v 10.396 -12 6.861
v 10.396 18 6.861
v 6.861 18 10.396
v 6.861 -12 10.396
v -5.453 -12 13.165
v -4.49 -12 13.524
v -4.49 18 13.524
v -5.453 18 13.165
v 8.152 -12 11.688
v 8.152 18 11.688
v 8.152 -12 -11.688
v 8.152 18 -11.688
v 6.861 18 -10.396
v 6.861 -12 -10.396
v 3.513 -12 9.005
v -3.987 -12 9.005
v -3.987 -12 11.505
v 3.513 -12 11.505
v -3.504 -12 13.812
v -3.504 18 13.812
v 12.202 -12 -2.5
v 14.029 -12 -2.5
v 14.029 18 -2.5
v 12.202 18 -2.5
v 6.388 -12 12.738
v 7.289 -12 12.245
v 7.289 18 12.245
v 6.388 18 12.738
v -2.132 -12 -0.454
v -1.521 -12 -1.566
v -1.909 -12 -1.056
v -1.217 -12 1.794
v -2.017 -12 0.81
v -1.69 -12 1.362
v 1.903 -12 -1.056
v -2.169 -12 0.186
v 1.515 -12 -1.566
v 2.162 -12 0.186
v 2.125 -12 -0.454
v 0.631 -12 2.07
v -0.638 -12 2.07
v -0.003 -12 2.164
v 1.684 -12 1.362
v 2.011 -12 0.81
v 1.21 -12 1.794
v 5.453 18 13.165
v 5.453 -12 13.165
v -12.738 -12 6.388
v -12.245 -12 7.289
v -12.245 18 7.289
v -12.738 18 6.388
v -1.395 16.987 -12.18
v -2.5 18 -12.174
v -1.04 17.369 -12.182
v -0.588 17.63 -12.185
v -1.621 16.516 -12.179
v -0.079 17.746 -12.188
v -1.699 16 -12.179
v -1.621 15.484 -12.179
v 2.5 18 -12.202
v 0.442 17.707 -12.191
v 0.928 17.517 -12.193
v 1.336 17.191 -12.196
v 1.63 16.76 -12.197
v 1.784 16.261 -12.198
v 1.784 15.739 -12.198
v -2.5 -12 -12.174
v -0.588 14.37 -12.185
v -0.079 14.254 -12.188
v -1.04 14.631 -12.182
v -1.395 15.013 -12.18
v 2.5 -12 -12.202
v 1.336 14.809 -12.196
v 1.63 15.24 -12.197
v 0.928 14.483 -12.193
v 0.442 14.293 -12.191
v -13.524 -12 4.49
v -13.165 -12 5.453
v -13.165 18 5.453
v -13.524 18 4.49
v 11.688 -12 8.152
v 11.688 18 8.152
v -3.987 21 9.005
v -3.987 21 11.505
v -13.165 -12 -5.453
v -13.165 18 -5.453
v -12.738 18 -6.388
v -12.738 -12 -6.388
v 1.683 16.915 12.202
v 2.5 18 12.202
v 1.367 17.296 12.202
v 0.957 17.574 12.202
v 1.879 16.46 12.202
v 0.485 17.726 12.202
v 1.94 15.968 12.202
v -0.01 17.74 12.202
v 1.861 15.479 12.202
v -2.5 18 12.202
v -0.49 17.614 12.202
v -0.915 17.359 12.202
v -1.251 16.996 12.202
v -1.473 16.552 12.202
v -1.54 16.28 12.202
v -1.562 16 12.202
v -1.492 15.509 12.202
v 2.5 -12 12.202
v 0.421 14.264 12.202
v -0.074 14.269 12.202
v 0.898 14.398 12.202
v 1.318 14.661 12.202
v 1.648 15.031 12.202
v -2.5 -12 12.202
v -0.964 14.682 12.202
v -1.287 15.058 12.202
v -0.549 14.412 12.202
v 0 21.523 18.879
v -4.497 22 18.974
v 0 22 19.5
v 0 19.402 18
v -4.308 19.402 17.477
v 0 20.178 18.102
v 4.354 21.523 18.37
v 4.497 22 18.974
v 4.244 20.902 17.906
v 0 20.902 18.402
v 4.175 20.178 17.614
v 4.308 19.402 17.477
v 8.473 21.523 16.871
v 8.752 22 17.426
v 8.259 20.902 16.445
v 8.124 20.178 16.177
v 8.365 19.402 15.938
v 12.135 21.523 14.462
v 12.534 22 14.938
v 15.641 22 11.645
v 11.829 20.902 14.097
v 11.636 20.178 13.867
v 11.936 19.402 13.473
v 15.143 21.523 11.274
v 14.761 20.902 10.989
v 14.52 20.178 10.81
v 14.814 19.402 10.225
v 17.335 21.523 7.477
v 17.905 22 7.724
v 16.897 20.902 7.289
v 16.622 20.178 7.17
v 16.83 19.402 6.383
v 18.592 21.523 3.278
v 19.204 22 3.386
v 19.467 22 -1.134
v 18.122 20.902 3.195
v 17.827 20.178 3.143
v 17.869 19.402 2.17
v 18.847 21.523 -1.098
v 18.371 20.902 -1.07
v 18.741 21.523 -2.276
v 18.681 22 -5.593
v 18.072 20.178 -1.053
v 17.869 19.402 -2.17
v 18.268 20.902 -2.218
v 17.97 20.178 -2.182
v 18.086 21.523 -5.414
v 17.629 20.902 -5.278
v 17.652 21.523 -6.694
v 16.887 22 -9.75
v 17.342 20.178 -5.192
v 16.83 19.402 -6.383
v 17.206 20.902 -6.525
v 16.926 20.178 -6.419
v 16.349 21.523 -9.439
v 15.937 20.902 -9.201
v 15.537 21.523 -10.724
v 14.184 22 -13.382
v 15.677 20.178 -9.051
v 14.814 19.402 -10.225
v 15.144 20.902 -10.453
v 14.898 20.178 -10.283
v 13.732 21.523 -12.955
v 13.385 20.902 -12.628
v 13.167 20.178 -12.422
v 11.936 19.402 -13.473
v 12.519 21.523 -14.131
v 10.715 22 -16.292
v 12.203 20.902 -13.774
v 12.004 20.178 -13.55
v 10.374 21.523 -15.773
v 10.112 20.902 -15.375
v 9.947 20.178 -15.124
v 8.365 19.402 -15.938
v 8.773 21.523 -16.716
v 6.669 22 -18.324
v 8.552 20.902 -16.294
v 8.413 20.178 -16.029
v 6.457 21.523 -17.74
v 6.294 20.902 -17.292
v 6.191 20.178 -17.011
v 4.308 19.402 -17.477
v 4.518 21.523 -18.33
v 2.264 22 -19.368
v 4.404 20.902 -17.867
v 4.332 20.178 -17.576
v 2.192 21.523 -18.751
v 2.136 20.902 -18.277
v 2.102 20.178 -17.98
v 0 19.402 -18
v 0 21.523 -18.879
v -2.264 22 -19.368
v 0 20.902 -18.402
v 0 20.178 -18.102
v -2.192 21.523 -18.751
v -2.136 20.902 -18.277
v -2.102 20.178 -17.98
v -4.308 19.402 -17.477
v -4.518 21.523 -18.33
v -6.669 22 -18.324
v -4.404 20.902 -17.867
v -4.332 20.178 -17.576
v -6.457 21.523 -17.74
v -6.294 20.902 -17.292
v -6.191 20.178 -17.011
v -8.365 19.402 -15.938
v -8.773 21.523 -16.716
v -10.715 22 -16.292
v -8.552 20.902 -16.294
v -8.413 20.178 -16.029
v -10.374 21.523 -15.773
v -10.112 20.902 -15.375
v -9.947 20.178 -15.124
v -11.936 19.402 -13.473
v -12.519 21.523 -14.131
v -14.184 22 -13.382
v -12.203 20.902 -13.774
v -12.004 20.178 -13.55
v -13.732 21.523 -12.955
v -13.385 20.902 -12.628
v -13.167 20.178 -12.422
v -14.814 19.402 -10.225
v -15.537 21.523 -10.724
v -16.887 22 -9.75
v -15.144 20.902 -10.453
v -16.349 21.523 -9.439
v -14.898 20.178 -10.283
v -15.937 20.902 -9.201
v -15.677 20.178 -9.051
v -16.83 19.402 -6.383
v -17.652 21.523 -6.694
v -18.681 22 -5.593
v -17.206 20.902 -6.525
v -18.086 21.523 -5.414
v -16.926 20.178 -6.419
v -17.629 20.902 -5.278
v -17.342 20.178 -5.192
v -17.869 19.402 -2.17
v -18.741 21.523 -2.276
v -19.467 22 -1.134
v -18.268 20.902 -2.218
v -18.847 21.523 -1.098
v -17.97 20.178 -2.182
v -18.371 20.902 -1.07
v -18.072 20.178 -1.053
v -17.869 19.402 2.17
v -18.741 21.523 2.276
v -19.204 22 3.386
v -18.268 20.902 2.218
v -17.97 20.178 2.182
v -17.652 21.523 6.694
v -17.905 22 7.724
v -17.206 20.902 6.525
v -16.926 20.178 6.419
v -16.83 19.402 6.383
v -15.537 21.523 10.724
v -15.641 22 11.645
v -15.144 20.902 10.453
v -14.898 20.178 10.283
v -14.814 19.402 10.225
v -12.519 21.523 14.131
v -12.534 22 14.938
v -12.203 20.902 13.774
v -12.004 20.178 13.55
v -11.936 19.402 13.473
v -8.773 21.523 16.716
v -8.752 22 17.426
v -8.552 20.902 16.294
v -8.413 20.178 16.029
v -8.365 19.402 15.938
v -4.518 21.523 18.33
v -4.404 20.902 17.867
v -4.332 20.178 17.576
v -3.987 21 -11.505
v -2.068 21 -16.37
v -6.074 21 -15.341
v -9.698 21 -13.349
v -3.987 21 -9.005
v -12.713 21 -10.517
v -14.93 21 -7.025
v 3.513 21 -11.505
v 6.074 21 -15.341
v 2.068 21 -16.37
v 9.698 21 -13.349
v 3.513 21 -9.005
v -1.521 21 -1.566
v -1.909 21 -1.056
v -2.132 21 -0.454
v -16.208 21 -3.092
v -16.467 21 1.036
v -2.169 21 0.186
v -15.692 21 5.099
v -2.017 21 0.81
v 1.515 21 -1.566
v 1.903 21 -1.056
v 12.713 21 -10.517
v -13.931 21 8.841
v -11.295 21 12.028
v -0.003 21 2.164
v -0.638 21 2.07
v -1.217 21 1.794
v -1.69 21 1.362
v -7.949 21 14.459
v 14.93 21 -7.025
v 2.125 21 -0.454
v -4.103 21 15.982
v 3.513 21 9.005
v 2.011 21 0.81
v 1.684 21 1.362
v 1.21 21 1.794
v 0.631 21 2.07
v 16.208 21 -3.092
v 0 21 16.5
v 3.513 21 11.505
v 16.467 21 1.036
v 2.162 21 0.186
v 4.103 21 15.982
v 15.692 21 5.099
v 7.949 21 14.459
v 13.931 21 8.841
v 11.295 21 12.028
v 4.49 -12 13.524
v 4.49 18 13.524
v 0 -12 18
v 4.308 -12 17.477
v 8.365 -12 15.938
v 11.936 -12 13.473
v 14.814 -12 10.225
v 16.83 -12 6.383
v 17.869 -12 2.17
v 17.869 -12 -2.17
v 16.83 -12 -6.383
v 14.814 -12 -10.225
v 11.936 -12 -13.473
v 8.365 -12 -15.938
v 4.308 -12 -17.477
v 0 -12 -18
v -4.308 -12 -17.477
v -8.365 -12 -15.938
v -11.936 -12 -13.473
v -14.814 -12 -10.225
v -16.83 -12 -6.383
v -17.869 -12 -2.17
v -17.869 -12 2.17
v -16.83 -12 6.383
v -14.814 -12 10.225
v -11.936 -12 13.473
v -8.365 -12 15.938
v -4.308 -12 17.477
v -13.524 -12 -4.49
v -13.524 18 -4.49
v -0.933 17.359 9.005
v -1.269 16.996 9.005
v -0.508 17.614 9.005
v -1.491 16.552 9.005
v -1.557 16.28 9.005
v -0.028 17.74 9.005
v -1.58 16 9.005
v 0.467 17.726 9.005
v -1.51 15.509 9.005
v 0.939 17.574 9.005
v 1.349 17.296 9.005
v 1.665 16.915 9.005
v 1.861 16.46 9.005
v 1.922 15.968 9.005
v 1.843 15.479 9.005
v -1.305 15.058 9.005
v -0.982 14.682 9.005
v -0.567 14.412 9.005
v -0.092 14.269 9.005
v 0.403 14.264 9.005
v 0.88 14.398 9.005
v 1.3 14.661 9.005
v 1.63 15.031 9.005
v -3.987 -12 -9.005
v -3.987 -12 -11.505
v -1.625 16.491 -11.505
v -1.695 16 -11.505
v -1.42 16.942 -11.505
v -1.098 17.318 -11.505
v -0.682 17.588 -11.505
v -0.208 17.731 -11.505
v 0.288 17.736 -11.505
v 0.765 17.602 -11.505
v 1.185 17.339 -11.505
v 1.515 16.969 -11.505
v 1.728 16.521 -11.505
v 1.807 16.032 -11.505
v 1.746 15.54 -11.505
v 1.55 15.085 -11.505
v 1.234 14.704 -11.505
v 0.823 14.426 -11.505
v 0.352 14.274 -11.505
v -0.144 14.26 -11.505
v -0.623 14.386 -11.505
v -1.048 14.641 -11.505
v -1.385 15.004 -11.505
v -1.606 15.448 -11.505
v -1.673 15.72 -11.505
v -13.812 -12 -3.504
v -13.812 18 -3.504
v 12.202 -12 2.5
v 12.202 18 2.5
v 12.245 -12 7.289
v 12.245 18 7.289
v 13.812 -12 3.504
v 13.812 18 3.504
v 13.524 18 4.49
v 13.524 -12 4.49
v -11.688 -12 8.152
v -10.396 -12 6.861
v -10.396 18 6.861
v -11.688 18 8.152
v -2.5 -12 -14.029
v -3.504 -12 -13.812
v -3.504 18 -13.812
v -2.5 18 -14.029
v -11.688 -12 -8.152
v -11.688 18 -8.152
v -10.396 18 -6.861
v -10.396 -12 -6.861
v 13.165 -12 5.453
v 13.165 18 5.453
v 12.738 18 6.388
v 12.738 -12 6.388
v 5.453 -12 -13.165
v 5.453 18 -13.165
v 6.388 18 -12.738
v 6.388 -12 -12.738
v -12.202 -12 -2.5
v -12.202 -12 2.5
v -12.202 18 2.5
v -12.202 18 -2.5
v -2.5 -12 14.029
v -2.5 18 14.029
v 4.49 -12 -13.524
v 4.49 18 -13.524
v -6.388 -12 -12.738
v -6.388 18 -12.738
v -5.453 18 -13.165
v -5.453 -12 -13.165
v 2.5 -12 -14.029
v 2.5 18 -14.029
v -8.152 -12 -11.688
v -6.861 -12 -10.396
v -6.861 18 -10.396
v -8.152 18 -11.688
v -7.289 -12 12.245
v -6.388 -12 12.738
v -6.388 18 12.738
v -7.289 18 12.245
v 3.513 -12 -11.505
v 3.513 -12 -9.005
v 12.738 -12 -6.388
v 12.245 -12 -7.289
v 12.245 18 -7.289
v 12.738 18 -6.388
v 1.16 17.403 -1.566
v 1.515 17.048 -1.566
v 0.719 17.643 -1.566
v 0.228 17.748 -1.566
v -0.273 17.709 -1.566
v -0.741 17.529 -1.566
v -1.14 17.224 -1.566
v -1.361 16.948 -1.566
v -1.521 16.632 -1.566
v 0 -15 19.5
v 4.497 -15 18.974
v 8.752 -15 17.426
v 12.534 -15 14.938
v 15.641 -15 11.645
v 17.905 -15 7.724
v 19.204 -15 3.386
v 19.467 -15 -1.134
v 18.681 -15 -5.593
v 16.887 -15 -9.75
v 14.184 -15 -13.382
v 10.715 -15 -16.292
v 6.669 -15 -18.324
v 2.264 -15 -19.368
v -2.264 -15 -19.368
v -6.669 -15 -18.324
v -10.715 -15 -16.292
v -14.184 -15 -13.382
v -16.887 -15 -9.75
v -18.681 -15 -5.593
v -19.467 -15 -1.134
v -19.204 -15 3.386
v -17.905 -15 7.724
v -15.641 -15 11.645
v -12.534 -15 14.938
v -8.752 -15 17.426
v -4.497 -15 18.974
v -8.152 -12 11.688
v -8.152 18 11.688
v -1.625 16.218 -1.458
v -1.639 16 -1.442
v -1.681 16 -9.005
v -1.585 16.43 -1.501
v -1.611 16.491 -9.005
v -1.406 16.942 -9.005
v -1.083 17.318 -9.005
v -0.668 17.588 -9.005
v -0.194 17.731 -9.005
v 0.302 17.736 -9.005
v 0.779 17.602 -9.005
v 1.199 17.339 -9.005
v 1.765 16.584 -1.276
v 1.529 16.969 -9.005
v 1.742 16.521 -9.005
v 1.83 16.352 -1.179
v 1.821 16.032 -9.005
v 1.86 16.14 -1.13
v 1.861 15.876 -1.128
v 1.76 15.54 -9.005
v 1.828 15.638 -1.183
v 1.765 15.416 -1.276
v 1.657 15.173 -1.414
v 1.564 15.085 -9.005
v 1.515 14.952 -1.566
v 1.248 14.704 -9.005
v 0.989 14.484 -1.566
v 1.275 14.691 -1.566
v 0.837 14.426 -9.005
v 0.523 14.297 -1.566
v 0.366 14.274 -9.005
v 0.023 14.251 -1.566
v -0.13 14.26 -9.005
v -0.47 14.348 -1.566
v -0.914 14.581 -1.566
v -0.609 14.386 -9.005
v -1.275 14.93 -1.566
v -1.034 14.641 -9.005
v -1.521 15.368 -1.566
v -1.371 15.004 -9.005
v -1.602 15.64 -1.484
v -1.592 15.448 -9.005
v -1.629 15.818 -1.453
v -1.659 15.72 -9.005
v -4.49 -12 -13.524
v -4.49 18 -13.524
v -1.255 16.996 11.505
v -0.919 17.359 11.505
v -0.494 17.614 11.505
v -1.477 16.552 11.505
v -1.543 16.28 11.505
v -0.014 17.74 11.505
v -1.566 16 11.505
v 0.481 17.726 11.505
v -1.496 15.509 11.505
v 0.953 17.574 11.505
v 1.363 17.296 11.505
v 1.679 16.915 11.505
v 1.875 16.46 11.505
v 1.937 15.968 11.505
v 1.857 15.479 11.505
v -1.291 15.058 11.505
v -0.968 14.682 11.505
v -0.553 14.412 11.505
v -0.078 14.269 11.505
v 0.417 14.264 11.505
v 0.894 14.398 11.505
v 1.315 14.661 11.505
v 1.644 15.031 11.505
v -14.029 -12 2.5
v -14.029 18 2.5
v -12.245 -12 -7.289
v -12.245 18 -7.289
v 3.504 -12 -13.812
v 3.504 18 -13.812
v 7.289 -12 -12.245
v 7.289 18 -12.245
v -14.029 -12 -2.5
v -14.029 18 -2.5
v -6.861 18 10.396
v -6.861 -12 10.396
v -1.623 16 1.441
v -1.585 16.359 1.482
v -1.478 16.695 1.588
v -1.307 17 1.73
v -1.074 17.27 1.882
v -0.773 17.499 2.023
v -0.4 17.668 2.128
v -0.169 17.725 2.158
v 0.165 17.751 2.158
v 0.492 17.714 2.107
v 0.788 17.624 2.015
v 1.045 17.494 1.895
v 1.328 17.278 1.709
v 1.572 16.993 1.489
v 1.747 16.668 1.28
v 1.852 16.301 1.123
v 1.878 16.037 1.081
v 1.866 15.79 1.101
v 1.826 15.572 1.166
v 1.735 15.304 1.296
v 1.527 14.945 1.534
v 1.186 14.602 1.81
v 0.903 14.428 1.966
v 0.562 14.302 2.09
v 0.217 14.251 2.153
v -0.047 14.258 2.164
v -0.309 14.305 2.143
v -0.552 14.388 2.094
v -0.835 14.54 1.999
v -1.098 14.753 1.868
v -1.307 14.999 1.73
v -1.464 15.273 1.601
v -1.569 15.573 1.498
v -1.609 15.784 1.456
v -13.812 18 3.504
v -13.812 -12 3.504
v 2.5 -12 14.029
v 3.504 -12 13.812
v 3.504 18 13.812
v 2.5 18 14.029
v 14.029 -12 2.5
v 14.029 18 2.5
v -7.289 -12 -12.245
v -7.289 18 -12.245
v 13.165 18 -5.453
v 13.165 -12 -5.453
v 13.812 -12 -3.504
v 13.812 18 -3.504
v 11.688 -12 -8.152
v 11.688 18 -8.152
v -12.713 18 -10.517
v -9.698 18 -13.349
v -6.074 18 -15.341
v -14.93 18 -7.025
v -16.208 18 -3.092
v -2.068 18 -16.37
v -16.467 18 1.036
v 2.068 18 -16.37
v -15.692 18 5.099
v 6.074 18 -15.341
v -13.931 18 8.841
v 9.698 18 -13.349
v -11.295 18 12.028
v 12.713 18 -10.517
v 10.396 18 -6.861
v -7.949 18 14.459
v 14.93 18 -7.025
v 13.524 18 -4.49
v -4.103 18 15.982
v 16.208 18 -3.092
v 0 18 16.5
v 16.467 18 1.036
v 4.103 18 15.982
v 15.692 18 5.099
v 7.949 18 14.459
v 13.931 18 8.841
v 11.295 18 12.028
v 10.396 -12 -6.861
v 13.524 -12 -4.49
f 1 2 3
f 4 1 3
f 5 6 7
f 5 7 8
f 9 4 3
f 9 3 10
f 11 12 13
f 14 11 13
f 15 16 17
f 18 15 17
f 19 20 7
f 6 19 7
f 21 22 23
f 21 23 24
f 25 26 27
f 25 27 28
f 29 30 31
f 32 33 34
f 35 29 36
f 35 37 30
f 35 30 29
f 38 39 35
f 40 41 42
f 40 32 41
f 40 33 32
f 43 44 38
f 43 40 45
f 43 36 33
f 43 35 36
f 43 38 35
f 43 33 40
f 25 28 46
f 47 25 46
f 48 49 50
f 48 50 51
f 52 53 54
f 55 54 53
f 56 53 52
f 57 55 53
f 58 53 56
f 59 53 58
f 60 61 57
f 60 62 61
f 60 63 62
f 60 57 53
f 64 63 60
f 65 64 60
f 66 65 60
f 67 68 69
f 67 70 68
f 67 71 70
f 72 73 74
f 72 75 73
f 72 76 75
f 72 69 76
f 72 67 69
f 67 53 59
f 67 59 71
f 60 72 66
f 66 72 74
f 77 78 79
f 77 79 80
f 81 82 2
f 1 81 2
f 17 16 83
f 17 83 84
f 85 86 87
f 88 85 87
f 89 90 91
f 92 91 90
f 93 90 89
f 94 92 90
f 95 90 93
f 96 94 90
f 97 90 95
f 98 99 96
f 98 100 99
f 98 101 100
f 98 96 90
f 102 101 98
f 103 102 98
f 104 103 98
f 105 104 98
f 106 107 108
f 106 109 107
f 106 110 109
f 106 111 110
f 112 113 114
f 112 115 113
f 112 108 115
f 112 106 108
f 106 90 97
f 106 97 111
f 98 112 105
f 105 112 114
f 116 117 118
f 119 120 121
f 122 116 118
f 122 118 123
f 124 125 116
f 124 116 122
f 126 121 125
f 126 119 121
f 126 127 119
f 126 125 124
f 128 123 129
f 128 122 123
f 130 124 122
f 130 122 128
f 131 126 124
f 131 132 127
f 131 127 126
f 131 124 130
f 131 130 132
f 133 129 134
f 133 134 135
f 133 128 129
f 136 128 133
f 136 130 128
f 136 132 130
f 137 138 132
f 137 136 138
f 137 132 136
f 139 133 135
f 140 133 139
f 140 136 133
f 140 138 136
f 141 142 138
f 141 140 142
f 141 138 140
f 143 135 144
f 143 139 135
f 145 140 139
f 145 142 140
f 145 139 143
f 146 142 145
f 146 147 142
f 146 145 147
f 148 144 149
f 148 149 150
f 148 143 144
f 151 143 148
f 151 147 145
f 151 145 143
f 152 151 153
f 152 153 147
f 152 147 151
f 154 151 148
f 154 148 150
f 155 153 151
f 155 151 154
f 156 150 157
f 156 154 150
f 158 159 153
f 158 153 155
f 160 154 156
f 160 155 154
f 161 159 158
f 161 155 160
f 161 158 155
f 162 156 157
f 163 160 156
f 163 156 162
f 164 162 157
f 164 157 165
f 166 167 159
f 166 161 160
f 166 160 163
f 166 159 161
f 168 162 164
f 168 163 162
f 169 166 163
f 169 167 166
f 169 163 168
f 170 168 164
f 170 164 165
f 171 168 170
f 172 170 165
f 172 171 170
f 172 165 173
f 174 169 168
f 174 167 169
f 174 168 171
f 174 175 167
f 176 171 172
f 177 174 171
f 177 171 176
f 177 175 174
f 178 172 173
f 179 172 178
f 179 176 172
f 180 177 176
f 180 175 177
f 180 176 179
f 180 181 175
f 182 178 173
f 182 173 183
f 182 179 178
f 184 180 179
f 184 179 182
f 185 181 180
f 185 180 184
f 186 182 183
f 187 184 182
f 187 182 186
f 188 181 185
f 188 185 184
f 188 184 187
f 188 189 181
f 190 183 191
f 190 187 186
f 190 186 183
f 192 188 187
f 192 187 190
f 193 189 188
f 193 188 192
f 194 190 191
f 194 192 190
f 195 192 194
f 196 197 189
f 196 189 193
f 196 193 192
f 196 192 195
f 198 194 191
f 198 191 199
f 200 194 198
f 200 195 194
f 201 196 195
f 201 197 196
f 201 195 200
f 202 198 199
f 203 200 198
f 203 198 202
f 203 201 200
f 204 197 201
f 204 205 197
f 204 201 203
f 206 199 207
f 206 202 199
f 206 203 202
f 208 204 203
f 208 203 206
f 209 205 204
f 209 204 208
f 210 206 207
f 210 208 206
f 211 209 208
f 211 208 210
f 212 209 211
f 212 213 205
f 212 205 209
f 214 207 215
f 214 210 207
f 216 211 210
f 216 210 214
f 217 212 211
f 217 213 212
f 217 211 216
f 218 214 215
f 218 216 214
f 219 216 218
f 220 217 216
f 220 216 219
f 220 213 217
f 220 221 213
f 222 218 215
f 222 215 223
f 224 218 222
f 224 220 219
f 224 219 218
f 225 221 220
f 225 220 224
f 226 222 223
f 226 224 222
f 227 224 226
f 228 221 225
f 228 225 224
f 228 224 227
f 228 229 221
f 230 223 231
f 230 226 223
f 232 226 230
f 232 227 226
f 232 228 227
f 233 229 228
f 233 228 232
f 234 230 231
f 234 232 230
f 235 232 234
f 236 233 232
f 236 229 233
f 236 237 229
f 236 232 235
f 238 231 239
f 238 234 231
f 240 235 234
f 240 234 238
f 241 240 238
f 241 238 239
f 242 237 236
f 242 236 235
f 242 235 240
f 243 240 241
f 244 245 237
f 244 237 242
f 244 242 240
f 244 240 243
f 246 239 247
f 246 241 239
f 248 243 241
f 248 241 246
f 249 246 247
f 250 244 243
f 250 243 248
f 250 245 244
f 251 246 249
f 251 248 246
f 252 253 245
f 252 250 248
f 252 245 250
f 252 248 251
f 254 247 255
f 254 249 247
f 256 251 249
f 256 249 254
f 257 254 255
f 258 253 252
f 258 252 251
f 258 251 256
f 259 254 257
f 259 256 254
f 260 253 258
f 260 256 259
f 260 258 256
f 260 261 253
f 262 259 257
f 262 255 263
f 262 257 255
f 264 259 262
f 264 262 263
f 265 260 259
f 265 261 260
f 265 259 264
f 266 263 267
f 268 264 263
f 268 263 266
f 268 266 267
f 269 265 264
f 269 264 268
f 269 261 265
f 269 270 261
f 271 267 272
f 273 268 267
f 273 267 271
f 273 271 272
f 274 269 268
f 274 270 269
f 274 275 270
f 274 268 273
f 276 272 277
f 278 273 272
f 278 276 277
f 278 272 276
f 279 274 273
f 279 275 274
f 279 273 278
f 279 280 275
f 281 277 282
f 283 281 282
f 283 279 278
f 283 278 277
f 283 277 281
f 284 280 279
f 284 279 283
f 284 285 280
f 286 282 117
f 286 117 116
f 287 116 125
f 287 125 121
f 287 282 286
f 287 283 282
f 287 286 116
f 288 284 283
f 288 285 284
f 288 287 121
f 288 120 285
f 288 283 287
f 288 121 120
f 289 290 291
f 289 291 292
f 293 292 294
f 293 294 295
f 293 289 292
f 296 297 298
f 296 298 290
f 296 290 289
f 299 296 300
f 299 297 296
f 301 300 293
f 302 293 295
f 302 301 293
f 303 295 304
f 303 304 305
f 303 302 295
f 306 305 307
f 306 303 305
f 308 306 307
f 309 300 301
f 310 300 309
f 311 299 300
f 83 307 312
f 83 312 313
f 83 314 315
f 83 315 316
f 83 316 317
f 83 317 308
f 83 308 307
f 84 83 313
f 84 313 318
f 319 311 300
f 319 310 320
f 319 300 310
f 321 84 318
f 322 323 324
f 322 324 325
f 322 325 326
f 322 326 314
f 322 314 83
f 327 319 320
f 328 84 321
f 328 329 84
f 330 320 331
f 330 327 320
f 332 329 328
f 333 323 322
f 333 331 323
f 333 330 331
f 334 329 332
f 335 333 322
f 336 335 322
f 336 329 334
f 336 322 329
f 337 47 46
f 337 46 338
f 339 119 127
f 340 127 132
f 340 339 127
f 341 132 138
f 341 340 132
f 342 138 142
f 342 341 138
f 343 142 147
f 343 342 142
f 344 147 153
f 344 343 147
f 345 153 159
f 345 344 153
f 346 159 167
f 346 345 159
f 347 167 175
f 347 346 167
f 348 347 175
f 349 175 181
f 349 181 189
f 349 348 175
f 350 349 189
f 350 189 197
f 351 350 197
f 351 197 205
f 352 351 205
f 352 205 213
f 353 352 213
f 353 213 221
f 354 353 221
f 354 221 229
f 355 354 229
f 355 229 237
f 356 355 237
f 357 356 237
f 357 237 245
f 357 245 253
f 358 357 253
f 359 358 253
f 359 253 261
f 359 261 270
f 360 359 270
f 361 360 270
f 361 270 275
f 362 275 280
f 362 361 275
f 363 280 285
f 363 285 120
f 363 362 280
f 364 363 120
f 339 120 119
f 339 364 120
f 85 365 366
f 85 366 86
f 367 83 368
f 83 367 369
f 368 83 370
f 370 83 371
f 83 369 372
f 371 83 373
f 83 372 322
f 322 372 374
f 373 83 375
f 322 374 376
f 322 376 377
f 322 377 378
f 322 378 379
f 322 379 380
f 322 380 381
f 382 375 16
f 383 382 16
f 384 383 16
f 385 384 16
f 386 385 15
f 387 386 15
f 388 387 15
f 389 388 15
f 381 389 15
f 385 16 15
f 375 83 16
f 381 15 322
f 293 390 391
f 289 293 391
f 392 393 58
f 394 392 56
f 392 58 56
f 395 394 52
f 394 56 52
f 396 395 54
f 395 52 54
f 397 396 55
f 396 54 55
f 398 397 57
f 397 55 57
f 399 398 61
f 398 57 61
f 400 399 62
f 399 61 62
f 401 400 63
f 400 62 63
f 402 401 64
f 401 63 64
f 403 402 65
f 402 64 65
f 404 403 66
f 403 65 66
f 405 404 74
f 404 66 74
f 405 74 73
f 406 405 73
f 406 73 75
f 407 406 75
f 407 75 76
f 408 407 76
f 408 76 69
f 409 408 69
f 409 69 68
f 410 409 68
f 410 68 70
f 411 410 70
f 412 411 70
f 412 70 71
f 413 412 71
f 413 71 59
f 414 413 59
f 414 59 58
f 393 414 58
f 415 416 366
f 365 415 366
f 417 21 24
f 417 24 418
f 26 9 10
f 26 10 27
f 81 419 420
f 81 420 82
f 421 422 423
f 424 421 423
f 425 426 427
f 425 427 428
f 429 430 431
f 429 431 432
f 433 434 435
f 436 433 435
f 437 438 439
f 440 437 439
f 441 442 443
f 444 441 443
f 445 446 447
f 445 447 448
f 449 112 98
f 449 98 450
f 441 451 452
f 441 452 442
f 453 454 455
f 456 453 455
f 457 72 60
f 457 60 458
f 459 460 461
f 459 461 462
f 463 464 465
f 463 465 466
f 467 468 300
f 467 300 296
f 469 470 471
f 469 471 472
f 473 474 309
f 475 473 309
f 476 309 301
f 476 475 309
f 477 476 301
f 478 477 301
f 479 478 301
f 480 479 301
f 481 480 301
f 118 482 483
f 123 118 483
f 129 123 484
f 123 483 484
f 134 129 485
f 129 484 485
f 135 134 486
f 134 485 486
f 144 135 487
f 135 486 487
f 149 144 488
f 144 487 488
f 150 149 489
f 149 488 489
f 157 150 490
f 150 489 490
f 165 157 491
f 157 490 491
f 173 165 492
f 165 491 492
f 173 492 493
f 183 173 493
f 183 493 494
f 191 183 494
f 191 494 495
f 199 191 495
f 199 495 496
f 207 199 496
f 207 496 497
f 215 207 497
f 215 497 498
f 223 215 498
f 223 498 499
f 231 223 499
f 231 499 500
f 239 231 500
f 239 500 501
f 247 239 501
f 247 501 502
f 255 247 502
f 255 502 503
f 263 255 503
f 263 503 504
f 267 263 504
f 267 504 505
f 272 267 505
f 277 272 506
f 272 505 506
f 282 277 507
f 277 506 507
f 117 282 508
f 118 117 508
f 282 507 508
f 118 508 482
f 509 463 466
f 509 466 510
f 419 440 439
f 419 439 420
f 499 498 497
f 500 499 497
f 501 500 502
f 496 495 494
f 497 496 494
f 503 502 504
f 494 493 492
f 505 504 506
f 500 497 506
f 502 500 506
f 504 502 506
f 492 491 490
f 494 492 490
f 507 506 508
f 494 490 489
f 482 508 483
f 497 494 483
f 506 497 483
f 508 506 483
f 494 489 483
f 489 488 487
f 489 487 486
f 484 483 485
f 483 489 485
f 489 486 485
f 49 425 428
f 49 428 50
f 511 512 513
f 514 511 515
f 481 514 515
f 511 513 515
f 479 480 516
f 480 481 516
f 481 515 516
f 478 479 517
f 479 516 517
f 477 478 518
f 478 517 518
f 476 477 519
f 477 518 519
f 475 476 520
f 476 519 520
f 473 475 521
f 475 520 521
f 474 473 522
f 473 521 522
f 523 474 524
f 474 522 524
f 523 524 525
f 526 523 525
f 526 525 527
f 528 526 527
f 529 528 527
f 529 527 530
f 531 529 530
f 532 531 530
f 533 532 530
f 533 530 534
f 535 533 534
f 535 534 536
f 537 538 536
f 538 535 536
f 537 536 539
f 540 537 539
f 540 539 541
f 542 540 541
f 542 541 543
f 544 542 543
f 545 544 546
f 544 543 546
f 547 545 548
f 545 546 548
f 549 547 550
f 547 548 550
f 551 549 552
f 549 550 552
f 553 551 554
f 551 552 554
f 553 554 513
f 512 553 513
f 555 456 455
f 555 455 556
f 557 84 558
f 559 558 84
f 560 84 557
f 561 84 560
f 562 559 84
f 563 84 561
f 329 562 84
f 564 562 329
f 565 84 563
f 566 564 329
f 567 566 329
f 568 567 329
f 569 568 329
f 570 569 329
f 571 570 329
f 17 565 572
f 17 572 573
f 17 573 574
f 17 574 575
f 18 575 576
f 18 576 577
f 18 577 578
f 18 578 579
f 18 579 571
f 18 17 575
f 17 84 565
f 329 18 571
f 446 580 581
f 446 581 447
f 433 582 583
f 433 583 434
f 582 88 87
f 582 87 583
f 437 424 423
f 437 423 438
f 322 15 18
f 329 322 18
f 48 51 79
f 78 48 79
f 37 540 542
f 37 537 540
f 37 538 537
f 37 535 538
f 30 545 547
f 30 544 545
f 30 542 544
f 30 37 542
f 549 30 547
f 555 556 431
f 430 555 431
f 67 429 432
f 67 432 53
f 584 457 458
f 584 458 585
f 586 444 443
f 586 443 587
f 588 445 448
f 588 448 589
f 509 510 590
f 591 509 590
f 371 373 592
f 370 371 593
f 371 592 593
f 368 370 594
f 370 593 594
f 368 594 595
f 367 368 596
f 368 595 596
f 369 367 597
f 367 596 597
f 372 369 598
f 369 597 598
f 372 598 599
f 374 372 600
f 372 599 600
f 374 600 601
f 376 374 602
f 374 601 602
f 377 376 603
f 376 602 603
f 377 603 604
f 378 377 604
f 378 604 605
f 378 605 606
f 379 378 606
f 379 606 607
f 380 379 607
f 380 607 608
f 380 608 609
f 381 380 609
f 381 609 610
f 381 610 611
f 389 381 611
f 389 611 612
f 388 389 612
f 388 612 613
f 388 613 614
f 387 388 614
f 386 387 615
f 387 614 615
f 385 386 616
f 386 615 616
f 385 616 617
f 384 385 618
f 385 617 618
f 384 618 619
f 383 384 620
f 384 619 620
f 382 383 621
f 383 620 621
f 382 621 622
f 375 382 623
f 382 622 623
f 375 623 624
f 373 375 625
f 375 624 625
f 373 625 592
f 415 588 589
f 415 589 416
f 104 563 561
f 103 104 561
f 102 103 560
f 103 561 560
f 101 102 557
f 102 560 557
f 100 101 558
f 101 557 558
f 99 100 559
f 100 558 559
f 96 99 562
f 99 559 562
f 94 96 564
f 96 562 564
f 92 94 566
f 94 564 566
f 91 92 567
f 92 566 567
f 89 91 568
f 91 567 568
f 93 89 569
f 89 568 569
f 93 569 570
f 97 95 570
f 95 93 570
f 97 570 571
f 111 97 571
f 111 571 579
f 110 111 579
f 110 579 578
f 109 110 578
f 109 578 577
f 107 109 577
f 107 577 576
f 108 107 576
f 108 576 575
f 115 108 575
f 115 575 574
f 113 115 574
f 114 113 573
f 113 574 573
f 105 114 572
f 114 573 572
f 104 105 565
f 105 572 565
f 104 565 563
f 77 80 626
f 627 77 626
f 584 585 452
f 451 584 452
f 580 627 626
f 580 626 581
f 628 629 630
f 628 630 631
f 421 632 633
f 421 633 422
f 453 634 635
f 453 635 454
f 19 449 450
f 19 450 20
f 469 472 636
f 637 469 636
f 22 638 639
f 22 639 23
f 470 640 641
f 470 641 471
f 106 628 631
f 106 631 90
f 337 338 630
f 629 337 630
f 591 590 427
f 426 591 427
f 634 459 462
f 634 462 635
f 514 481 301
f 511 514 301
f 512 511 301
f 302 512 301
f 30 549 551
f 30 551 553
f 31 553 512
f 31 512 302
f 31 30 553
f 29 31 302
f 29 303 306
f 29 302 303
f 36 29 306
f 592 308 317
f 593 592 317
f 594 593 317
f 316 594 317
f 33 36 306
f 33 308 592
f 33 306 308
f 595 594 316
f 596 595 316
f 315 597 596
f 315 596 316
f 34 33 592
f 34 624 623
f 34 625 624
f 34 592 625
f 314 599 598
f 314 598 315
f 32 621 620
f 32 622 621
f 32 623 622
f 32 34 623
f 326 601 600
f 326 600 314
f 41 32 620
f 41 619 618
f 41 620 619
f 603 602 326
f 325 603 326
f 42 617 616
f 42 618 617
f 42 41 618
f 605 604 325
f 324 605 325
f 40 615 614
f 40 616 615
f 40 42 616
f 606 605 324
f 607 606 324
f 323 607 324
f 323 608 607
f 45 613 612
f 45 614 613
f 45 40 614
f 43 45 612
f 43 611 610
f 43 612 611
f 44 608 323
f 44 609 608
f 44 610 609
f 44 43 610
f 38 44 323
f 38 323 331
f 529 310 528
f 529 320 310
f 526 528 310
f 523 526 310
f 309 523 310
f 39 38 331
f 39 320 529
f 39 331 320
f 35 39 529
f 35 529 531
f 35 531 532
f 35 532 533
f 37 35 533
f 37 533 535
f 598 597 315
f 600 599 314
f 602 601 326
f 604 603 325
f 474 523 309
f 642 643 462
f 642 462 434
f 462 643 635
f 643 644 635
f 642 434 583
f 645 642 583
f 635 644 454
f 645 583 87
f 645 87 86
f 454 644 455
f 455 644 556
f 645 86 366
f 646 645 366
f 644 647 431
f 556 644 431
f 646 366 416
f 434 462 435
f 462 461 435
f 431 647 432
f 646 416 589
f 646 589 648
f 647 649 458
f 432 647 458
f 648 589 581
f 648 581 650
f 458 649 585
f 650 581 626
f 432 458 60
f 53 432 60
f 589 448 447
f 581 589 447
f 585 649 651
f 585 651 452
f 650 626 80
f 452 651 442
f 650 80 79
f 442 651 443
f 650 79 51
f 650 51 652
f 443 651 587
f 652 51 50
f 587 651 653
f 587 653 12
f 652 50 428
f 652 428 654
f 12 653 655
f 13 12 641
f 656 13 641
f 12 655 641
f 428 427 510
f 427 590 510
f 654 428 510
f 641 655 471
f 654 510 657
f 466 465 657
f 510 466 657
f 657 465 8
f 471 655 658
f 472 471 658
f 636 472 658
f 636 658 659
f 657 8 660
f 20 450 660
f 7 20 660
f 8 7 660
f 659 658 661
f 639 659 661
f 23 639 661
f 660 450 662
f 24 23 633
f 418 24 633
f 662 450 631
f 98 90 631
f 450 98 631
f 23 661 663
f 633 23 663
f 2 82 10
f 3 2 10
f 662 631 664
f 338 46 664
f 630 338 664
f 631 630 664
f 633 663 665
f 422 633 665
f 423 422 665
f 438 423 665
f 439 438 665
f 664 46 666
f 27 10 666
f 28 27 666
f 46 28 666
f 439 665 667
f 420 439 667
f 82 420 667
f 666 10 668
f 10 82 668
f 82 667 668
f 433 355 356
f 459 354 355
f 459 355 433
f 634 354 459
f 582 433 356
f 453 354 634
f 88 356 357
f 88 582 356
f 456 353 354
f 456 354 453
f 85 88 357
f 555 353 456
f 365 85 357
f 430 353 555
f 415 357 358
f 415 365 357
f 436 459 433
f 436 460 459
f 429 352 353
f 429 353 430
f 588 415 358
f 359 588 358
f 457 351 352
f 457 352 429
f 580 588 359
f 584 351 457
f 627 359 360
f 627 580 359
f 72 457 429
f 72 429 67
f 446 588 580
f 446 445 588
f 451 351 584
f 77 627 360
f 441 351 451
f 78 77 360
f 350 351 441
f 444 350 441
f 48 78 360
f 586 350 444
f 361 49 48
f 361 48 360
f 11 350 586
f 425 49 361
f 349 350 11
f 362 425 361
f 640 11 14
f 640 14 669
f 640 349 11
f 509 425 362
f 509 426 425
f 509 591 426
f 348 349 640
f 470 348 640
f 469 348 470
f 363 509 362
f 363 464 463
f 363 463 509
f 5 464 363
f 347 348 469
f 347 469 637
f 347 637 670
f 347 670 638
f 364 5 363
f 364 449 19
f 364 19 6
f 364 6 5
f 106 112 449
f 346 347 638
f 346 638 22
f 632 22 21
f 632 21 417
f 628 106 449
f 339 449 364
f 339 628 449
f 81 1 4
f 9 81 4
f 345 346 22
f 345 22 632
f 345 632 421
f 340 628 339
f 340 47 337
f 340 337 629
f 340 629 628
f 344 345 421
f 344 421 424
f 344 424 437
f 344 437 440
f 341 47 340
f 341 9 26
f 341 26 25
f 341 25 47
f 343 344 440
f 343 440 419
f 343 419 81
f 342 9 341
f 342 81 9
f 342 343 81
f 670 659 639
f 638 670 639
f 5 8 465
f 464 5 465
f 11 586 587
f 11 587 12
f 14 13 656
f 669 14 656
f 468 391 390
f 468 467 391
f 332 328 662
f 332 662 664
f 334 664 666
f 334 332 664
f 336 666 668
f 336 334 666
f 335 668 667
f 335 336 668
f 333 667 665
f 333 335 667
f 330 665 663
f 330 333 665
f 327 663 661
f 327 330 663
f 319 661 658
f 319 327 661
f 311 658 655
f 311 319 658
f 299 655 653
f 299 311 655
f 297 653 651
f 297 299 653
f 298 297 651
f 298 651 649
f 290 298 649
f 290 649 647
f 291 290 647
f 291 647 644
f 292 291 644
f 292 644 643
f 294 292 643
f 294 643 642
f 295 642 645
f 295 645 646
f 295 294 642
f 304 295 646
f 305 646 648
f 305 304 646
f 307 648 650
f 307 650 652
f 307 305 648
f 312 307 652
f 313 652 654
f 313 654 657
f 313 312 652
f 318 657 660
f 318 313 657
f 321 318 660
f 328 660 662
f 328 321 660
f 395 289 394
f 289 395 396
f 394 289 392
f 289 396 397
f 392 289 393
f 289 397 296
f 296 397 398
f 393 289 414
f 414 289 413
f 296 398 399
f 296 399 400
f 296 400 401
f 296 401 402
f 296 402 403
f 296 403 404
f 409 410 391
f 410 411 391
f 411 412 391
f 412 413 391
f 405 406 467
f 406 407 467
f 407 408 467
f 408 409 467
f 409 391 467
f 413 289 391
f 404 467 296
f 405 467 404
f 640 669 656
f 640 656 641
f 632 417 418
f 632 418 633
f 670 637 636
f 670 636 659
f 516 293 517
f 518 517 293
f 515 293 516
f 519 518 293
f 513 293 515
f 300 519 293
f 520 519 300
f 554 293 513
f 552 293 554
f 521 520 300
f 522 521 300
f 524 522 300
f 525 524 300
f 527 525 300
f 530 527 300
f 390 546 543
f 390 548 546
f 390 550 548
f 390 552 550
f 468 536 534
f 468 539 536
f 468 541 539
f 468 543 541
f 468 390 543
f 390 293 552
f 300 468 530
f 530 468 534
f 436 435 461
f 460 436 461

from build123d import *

# Parameters (mm, degrees)
SKETCH1_R           = 17
BOSS_EXTRUDE1_DEPTH = 3
SKETCH3_R           = 17
BOSS_EXTRUDE2_DEPTH = 3
BOSS_EXTRUDE3_DEPTH = 31
SKETCH7_R           = 1.751351815
CUT_EXTRUDE11_DEPTH = 50
CUT_EXTRUDE1_DEPTH  = 50
SKETCH8_W           = 7.5
SKETCH8_H           = 2.5
CUT_EXTRUDE12_DEPTH = 40
SKETCH9_R           = 19.5
SKETCH9_R_2         = 18
BOSS_EXTRUDE4_DEPTH = 37
FILLET1_R           = 3
SKETCH10_R          = 17
SKETCH10_R_2        = 16.5
CUT_EXTRUDE13_DEPTH = 3
SKETCH11_R          = 19.5
BOSS_EXTRUDE5_DEPTH = 3


with BuildPart() as part:
    # Sketch1 → Boss-Extrude1 (new body)
    with BuildSketch(Plane(origin=(0, -15, 0), x_dir=(1, 0, 0), z_dir=(0, 1, 0))):
        with Locations(Location((0, 0, 0), (0, 0, 270))):
            Circle(SKETCH1_R)
    extrude(amount=BOSS_EXTRUDE1_DEPTH)



with BuildPart() as body_2:
    # Sketch3 → Boss-Extrude2 (new body)
    with BuildSketch(Plane(origin=(0, 21, 0), x_dir=(1, 0, 0), z_dir=(0, 1, 0))):
        with Locations(Location((0, 0, 0), (0, 0, 270))):
            Circle(SKETCH3_R)
    extrude(amount=-BOSS_EXTRUDE2_DEPTH)


with BuildPart() as part_1:
    add(part.part)

    add(body_2.part)  # Boss-Extrude3 merges body 2
    # Sketch6 → Boss-Extrude3 (add)
    with BuildSketch(Plane(origin=(0, -12, 0), x_dir=(1, 0, 0), z_dir=(0, 1, 0))):
        Polygon((-10.39609313, -6.860559341), (-11.68775931, -8.152225055), (-12.244775891, -7.288892753), (-12.738139369, -6.387668662), (-13.165283017, -5.453239195), (-13.523988426, -4.490460269), (-13.812389225, -3.504338907), (-14.028987847, -2.499999944), (-12.202296406, -2.499999944), (-12.202296406, 2.499999944), (-14.028987847, 2.499999944), (-13.812389225, 3.504338907), (-13.523988426, 4.490460269), (-13.165283017, 5.453239195), (-12.738139369, 6.387668662), (-12.244775891, 7.288892753), (-11.68775931, 8.152225055), (-10.39609313, 6.860559341), (-6.860559341, 10.39609313), (-8.152225055, 11.68775931), (-7.288892753, 12.244775891), (-6.387668662, 12.738139369), (-5.453239195, 13.165283017), (-4.490460269, 13.523988426), (-3.504338907, 13.812389225), (-2.499999944, 14.028987847), (-2.499999944, 12.174172863), (2.499999944, 12.202296406), (2.499999944, 14.028987847), (3.504338907, 13.812389225), (4.490460269, 13.523988426), (5.453239195, 13.165283017), (6.387668662, 12.738139369), (7.288892753, 12.244775891), (8.152225055, 11.68775931), (6.860559341, 10.39609313), (10.39609313, 6.860559341), (11.68775931, 8.152225055), (12.244775891, 7.288892753), (12.738139369, 6.387668662), (13.165283017, 5.453239195), (13.523988426, 4.490460269), (13.812389225, 3.504338907), (14.028987847, 2.499999944), (12.202296406, 2.499999944), (12.202296406, -2.499999944), (14.028987847, -2.499999944), (13.812389225, -3.504338907), (13.523988426, -4.490460269), (13.165283017, -5.453239195), (12.738139369, -6.387668662), (12.244775891, -7.288892753), (11.68775931, -8.152225055), (10.39609313, -6.860559341), (6.860559341, -10.39609313), (8.152225055, -11.68775931), (7.288892753, -12.244775891), (6.387668662, -12.738139369), (5.453239195, -13.165283017), (4.490460269, -13.523988426), (3.504338907, -13.812389225), (2.499999944, -14.028987847), (2.499999944, -12.202296406), (-2.499999944, -12.202296406), (-2.499999944, -14.028987847), (-3.504338907, -13.812389225), (-4.490460269, -13.523988426), (-5.453239195, -13.165283017), (-6.387668662, -12.738139369), (-7.288892753, -12.244775891), (-8.152225055, -11.68775931), (-6.860559341, -10.39609313), align=None)
    extrude(amount=BOSS_EXTRUDE3_DEPTH)

    # Sketch7 → Cut-Extrude11 (cut)
    with BuildSketch(Plane(origin=(-0.068553102, 0, -12.187849043), x_dir=(-0.9999841817006155, 0, 0.005624619858302935), z_dir=(-0.005624619858302935, 0, -0.9999841817006155))):
        with Locations((-0.120761258, 16)):
            Circle(SKETCH7_R)
    extrude(amount=-CUT_EXTRUDE11_DEPTH, mode=Mode.SUBTRACT)

    # Sketch2 → Cut-Extrude1 (cut)
    with BuildSketch(Plane(origin=(0, -15, 0), x_dir=(1, 0, 0), z_dir=(0, 1, 0))):
        with BuildLine():
            Line((1.514793699, 1.566442938), (-1.521232282, 1.566442938))
            ThreePointArc((-1.521232282, 1.566442938), (-0.003219291, -2.164389177), (1.514793699, 1.566442938))
        make_face()
    extrude(amount=CUT_EXTRUDE1_DEPTH, mode=Mode.SUBTRACT)

    # Sketch8 → Cut-Extrude12 (cut)
    with BuildSketch(Plane(origin=(0, -15, 0), x_dir=(1, 0, 0), z_dir=(0, 1, 0))):
        with Locations((-0.237061367, 10.255385433)):
            Rectangle(SKETCH8_W, SKETCH8_H)
    cut_extrude12 = extrude(amount=CUT_EXTRUDE12_DEPTH, mode=Mode.SUBTRACT)

    # Mirror1: Cut-Extrude12 across plane
    add(cut_extrude12.mirror(Plane.XY), mode=Mode.SUBTRACT)

    # Sketch10 → Cut-Extrude13 (cut)
    with BuildSketch(Plane(origin=(0, 21, 0), x_dir=(1, 0, 0), z_dir=(0, 1, 0))):
        with Locations(Location((0, 0, 0), (0, 0, 270))):
            Circle(SKETCH10_R)
        with Locations(Location((0, 0, 0), (0, 0, 270))):
            Circle(SKETCH10_R_2, mode=Mode.SUBTRACT)
    extrude(amount=-CUT_EXTRUDE13_DEPTH, mode=Mode.SUBTRACT)



with BuildPart() as body_2_2:
    # Sketch9 → Boss-Extrude4 (new body)
    with BuildSketch(Plane(origin=(0, -15, 0), x_dir=(1, 0, 0), z_dir=(0, 1, 0))):
        with Locations(Location((0, 0, 0), (0, 0, 270))):
            Circle(SKETCH9_R)
        with Locations(Location((0, 0, 0), (0, 0, 270))):
            Circle(SKETCH9_R_2, mode=Mode.SUBTRACT)
    extrude(amount=BOSS_EXTRUDE4_DEPTH)

    # Fillet1
    # the kernel refuses this fillet: 3 mm, written as the material it takes off along each edge
    with BuildSketch(Plane(origin=(0, 22, 0), x_dir=(0, 0, 1), z_dir=(-1, 0, 0))) as fillet1_piece_1:
        with BuildLine():
            CenterArc((21, -2.598076211), FILLET1_R, 120, 60)
            Line((19.5, 0), (19.47, 0.051961524))
            ThreePointArc((19.47, 0.051961524), (18.75, 0.06), (18, 0.06))
            Line((18, 0.06), (17.94, 0))
            Line((17.94, 0), (17.94, -2.598076211))
            Line((17.94, -2.598076211), (18, -2.598076211))
        make_face()
    revolve(axis=Axis((0, 22, 0), (0, 1, 0)), mode=Mode.SUBTRACT)


with BuildPart() as part_2:
    add(part_1.part)

    add(body_2_2.part)  # Boss-Extrude5 merges body 2 2
    # Sketch11 → Boss-Extrude5 (add)
    with BuildSketch(Plane(origin=(0, -15, 0), x_dir=(1, 0, 0), z_dir=(0, 1, 0))):
        with Locations(Location((0, 0, 0), (0, 0, 270))):
            Circle(SKETCH11_R)
    extrude(amount=BOSS_EXTRUDE5_DEPTH)


solid = part_2.part
